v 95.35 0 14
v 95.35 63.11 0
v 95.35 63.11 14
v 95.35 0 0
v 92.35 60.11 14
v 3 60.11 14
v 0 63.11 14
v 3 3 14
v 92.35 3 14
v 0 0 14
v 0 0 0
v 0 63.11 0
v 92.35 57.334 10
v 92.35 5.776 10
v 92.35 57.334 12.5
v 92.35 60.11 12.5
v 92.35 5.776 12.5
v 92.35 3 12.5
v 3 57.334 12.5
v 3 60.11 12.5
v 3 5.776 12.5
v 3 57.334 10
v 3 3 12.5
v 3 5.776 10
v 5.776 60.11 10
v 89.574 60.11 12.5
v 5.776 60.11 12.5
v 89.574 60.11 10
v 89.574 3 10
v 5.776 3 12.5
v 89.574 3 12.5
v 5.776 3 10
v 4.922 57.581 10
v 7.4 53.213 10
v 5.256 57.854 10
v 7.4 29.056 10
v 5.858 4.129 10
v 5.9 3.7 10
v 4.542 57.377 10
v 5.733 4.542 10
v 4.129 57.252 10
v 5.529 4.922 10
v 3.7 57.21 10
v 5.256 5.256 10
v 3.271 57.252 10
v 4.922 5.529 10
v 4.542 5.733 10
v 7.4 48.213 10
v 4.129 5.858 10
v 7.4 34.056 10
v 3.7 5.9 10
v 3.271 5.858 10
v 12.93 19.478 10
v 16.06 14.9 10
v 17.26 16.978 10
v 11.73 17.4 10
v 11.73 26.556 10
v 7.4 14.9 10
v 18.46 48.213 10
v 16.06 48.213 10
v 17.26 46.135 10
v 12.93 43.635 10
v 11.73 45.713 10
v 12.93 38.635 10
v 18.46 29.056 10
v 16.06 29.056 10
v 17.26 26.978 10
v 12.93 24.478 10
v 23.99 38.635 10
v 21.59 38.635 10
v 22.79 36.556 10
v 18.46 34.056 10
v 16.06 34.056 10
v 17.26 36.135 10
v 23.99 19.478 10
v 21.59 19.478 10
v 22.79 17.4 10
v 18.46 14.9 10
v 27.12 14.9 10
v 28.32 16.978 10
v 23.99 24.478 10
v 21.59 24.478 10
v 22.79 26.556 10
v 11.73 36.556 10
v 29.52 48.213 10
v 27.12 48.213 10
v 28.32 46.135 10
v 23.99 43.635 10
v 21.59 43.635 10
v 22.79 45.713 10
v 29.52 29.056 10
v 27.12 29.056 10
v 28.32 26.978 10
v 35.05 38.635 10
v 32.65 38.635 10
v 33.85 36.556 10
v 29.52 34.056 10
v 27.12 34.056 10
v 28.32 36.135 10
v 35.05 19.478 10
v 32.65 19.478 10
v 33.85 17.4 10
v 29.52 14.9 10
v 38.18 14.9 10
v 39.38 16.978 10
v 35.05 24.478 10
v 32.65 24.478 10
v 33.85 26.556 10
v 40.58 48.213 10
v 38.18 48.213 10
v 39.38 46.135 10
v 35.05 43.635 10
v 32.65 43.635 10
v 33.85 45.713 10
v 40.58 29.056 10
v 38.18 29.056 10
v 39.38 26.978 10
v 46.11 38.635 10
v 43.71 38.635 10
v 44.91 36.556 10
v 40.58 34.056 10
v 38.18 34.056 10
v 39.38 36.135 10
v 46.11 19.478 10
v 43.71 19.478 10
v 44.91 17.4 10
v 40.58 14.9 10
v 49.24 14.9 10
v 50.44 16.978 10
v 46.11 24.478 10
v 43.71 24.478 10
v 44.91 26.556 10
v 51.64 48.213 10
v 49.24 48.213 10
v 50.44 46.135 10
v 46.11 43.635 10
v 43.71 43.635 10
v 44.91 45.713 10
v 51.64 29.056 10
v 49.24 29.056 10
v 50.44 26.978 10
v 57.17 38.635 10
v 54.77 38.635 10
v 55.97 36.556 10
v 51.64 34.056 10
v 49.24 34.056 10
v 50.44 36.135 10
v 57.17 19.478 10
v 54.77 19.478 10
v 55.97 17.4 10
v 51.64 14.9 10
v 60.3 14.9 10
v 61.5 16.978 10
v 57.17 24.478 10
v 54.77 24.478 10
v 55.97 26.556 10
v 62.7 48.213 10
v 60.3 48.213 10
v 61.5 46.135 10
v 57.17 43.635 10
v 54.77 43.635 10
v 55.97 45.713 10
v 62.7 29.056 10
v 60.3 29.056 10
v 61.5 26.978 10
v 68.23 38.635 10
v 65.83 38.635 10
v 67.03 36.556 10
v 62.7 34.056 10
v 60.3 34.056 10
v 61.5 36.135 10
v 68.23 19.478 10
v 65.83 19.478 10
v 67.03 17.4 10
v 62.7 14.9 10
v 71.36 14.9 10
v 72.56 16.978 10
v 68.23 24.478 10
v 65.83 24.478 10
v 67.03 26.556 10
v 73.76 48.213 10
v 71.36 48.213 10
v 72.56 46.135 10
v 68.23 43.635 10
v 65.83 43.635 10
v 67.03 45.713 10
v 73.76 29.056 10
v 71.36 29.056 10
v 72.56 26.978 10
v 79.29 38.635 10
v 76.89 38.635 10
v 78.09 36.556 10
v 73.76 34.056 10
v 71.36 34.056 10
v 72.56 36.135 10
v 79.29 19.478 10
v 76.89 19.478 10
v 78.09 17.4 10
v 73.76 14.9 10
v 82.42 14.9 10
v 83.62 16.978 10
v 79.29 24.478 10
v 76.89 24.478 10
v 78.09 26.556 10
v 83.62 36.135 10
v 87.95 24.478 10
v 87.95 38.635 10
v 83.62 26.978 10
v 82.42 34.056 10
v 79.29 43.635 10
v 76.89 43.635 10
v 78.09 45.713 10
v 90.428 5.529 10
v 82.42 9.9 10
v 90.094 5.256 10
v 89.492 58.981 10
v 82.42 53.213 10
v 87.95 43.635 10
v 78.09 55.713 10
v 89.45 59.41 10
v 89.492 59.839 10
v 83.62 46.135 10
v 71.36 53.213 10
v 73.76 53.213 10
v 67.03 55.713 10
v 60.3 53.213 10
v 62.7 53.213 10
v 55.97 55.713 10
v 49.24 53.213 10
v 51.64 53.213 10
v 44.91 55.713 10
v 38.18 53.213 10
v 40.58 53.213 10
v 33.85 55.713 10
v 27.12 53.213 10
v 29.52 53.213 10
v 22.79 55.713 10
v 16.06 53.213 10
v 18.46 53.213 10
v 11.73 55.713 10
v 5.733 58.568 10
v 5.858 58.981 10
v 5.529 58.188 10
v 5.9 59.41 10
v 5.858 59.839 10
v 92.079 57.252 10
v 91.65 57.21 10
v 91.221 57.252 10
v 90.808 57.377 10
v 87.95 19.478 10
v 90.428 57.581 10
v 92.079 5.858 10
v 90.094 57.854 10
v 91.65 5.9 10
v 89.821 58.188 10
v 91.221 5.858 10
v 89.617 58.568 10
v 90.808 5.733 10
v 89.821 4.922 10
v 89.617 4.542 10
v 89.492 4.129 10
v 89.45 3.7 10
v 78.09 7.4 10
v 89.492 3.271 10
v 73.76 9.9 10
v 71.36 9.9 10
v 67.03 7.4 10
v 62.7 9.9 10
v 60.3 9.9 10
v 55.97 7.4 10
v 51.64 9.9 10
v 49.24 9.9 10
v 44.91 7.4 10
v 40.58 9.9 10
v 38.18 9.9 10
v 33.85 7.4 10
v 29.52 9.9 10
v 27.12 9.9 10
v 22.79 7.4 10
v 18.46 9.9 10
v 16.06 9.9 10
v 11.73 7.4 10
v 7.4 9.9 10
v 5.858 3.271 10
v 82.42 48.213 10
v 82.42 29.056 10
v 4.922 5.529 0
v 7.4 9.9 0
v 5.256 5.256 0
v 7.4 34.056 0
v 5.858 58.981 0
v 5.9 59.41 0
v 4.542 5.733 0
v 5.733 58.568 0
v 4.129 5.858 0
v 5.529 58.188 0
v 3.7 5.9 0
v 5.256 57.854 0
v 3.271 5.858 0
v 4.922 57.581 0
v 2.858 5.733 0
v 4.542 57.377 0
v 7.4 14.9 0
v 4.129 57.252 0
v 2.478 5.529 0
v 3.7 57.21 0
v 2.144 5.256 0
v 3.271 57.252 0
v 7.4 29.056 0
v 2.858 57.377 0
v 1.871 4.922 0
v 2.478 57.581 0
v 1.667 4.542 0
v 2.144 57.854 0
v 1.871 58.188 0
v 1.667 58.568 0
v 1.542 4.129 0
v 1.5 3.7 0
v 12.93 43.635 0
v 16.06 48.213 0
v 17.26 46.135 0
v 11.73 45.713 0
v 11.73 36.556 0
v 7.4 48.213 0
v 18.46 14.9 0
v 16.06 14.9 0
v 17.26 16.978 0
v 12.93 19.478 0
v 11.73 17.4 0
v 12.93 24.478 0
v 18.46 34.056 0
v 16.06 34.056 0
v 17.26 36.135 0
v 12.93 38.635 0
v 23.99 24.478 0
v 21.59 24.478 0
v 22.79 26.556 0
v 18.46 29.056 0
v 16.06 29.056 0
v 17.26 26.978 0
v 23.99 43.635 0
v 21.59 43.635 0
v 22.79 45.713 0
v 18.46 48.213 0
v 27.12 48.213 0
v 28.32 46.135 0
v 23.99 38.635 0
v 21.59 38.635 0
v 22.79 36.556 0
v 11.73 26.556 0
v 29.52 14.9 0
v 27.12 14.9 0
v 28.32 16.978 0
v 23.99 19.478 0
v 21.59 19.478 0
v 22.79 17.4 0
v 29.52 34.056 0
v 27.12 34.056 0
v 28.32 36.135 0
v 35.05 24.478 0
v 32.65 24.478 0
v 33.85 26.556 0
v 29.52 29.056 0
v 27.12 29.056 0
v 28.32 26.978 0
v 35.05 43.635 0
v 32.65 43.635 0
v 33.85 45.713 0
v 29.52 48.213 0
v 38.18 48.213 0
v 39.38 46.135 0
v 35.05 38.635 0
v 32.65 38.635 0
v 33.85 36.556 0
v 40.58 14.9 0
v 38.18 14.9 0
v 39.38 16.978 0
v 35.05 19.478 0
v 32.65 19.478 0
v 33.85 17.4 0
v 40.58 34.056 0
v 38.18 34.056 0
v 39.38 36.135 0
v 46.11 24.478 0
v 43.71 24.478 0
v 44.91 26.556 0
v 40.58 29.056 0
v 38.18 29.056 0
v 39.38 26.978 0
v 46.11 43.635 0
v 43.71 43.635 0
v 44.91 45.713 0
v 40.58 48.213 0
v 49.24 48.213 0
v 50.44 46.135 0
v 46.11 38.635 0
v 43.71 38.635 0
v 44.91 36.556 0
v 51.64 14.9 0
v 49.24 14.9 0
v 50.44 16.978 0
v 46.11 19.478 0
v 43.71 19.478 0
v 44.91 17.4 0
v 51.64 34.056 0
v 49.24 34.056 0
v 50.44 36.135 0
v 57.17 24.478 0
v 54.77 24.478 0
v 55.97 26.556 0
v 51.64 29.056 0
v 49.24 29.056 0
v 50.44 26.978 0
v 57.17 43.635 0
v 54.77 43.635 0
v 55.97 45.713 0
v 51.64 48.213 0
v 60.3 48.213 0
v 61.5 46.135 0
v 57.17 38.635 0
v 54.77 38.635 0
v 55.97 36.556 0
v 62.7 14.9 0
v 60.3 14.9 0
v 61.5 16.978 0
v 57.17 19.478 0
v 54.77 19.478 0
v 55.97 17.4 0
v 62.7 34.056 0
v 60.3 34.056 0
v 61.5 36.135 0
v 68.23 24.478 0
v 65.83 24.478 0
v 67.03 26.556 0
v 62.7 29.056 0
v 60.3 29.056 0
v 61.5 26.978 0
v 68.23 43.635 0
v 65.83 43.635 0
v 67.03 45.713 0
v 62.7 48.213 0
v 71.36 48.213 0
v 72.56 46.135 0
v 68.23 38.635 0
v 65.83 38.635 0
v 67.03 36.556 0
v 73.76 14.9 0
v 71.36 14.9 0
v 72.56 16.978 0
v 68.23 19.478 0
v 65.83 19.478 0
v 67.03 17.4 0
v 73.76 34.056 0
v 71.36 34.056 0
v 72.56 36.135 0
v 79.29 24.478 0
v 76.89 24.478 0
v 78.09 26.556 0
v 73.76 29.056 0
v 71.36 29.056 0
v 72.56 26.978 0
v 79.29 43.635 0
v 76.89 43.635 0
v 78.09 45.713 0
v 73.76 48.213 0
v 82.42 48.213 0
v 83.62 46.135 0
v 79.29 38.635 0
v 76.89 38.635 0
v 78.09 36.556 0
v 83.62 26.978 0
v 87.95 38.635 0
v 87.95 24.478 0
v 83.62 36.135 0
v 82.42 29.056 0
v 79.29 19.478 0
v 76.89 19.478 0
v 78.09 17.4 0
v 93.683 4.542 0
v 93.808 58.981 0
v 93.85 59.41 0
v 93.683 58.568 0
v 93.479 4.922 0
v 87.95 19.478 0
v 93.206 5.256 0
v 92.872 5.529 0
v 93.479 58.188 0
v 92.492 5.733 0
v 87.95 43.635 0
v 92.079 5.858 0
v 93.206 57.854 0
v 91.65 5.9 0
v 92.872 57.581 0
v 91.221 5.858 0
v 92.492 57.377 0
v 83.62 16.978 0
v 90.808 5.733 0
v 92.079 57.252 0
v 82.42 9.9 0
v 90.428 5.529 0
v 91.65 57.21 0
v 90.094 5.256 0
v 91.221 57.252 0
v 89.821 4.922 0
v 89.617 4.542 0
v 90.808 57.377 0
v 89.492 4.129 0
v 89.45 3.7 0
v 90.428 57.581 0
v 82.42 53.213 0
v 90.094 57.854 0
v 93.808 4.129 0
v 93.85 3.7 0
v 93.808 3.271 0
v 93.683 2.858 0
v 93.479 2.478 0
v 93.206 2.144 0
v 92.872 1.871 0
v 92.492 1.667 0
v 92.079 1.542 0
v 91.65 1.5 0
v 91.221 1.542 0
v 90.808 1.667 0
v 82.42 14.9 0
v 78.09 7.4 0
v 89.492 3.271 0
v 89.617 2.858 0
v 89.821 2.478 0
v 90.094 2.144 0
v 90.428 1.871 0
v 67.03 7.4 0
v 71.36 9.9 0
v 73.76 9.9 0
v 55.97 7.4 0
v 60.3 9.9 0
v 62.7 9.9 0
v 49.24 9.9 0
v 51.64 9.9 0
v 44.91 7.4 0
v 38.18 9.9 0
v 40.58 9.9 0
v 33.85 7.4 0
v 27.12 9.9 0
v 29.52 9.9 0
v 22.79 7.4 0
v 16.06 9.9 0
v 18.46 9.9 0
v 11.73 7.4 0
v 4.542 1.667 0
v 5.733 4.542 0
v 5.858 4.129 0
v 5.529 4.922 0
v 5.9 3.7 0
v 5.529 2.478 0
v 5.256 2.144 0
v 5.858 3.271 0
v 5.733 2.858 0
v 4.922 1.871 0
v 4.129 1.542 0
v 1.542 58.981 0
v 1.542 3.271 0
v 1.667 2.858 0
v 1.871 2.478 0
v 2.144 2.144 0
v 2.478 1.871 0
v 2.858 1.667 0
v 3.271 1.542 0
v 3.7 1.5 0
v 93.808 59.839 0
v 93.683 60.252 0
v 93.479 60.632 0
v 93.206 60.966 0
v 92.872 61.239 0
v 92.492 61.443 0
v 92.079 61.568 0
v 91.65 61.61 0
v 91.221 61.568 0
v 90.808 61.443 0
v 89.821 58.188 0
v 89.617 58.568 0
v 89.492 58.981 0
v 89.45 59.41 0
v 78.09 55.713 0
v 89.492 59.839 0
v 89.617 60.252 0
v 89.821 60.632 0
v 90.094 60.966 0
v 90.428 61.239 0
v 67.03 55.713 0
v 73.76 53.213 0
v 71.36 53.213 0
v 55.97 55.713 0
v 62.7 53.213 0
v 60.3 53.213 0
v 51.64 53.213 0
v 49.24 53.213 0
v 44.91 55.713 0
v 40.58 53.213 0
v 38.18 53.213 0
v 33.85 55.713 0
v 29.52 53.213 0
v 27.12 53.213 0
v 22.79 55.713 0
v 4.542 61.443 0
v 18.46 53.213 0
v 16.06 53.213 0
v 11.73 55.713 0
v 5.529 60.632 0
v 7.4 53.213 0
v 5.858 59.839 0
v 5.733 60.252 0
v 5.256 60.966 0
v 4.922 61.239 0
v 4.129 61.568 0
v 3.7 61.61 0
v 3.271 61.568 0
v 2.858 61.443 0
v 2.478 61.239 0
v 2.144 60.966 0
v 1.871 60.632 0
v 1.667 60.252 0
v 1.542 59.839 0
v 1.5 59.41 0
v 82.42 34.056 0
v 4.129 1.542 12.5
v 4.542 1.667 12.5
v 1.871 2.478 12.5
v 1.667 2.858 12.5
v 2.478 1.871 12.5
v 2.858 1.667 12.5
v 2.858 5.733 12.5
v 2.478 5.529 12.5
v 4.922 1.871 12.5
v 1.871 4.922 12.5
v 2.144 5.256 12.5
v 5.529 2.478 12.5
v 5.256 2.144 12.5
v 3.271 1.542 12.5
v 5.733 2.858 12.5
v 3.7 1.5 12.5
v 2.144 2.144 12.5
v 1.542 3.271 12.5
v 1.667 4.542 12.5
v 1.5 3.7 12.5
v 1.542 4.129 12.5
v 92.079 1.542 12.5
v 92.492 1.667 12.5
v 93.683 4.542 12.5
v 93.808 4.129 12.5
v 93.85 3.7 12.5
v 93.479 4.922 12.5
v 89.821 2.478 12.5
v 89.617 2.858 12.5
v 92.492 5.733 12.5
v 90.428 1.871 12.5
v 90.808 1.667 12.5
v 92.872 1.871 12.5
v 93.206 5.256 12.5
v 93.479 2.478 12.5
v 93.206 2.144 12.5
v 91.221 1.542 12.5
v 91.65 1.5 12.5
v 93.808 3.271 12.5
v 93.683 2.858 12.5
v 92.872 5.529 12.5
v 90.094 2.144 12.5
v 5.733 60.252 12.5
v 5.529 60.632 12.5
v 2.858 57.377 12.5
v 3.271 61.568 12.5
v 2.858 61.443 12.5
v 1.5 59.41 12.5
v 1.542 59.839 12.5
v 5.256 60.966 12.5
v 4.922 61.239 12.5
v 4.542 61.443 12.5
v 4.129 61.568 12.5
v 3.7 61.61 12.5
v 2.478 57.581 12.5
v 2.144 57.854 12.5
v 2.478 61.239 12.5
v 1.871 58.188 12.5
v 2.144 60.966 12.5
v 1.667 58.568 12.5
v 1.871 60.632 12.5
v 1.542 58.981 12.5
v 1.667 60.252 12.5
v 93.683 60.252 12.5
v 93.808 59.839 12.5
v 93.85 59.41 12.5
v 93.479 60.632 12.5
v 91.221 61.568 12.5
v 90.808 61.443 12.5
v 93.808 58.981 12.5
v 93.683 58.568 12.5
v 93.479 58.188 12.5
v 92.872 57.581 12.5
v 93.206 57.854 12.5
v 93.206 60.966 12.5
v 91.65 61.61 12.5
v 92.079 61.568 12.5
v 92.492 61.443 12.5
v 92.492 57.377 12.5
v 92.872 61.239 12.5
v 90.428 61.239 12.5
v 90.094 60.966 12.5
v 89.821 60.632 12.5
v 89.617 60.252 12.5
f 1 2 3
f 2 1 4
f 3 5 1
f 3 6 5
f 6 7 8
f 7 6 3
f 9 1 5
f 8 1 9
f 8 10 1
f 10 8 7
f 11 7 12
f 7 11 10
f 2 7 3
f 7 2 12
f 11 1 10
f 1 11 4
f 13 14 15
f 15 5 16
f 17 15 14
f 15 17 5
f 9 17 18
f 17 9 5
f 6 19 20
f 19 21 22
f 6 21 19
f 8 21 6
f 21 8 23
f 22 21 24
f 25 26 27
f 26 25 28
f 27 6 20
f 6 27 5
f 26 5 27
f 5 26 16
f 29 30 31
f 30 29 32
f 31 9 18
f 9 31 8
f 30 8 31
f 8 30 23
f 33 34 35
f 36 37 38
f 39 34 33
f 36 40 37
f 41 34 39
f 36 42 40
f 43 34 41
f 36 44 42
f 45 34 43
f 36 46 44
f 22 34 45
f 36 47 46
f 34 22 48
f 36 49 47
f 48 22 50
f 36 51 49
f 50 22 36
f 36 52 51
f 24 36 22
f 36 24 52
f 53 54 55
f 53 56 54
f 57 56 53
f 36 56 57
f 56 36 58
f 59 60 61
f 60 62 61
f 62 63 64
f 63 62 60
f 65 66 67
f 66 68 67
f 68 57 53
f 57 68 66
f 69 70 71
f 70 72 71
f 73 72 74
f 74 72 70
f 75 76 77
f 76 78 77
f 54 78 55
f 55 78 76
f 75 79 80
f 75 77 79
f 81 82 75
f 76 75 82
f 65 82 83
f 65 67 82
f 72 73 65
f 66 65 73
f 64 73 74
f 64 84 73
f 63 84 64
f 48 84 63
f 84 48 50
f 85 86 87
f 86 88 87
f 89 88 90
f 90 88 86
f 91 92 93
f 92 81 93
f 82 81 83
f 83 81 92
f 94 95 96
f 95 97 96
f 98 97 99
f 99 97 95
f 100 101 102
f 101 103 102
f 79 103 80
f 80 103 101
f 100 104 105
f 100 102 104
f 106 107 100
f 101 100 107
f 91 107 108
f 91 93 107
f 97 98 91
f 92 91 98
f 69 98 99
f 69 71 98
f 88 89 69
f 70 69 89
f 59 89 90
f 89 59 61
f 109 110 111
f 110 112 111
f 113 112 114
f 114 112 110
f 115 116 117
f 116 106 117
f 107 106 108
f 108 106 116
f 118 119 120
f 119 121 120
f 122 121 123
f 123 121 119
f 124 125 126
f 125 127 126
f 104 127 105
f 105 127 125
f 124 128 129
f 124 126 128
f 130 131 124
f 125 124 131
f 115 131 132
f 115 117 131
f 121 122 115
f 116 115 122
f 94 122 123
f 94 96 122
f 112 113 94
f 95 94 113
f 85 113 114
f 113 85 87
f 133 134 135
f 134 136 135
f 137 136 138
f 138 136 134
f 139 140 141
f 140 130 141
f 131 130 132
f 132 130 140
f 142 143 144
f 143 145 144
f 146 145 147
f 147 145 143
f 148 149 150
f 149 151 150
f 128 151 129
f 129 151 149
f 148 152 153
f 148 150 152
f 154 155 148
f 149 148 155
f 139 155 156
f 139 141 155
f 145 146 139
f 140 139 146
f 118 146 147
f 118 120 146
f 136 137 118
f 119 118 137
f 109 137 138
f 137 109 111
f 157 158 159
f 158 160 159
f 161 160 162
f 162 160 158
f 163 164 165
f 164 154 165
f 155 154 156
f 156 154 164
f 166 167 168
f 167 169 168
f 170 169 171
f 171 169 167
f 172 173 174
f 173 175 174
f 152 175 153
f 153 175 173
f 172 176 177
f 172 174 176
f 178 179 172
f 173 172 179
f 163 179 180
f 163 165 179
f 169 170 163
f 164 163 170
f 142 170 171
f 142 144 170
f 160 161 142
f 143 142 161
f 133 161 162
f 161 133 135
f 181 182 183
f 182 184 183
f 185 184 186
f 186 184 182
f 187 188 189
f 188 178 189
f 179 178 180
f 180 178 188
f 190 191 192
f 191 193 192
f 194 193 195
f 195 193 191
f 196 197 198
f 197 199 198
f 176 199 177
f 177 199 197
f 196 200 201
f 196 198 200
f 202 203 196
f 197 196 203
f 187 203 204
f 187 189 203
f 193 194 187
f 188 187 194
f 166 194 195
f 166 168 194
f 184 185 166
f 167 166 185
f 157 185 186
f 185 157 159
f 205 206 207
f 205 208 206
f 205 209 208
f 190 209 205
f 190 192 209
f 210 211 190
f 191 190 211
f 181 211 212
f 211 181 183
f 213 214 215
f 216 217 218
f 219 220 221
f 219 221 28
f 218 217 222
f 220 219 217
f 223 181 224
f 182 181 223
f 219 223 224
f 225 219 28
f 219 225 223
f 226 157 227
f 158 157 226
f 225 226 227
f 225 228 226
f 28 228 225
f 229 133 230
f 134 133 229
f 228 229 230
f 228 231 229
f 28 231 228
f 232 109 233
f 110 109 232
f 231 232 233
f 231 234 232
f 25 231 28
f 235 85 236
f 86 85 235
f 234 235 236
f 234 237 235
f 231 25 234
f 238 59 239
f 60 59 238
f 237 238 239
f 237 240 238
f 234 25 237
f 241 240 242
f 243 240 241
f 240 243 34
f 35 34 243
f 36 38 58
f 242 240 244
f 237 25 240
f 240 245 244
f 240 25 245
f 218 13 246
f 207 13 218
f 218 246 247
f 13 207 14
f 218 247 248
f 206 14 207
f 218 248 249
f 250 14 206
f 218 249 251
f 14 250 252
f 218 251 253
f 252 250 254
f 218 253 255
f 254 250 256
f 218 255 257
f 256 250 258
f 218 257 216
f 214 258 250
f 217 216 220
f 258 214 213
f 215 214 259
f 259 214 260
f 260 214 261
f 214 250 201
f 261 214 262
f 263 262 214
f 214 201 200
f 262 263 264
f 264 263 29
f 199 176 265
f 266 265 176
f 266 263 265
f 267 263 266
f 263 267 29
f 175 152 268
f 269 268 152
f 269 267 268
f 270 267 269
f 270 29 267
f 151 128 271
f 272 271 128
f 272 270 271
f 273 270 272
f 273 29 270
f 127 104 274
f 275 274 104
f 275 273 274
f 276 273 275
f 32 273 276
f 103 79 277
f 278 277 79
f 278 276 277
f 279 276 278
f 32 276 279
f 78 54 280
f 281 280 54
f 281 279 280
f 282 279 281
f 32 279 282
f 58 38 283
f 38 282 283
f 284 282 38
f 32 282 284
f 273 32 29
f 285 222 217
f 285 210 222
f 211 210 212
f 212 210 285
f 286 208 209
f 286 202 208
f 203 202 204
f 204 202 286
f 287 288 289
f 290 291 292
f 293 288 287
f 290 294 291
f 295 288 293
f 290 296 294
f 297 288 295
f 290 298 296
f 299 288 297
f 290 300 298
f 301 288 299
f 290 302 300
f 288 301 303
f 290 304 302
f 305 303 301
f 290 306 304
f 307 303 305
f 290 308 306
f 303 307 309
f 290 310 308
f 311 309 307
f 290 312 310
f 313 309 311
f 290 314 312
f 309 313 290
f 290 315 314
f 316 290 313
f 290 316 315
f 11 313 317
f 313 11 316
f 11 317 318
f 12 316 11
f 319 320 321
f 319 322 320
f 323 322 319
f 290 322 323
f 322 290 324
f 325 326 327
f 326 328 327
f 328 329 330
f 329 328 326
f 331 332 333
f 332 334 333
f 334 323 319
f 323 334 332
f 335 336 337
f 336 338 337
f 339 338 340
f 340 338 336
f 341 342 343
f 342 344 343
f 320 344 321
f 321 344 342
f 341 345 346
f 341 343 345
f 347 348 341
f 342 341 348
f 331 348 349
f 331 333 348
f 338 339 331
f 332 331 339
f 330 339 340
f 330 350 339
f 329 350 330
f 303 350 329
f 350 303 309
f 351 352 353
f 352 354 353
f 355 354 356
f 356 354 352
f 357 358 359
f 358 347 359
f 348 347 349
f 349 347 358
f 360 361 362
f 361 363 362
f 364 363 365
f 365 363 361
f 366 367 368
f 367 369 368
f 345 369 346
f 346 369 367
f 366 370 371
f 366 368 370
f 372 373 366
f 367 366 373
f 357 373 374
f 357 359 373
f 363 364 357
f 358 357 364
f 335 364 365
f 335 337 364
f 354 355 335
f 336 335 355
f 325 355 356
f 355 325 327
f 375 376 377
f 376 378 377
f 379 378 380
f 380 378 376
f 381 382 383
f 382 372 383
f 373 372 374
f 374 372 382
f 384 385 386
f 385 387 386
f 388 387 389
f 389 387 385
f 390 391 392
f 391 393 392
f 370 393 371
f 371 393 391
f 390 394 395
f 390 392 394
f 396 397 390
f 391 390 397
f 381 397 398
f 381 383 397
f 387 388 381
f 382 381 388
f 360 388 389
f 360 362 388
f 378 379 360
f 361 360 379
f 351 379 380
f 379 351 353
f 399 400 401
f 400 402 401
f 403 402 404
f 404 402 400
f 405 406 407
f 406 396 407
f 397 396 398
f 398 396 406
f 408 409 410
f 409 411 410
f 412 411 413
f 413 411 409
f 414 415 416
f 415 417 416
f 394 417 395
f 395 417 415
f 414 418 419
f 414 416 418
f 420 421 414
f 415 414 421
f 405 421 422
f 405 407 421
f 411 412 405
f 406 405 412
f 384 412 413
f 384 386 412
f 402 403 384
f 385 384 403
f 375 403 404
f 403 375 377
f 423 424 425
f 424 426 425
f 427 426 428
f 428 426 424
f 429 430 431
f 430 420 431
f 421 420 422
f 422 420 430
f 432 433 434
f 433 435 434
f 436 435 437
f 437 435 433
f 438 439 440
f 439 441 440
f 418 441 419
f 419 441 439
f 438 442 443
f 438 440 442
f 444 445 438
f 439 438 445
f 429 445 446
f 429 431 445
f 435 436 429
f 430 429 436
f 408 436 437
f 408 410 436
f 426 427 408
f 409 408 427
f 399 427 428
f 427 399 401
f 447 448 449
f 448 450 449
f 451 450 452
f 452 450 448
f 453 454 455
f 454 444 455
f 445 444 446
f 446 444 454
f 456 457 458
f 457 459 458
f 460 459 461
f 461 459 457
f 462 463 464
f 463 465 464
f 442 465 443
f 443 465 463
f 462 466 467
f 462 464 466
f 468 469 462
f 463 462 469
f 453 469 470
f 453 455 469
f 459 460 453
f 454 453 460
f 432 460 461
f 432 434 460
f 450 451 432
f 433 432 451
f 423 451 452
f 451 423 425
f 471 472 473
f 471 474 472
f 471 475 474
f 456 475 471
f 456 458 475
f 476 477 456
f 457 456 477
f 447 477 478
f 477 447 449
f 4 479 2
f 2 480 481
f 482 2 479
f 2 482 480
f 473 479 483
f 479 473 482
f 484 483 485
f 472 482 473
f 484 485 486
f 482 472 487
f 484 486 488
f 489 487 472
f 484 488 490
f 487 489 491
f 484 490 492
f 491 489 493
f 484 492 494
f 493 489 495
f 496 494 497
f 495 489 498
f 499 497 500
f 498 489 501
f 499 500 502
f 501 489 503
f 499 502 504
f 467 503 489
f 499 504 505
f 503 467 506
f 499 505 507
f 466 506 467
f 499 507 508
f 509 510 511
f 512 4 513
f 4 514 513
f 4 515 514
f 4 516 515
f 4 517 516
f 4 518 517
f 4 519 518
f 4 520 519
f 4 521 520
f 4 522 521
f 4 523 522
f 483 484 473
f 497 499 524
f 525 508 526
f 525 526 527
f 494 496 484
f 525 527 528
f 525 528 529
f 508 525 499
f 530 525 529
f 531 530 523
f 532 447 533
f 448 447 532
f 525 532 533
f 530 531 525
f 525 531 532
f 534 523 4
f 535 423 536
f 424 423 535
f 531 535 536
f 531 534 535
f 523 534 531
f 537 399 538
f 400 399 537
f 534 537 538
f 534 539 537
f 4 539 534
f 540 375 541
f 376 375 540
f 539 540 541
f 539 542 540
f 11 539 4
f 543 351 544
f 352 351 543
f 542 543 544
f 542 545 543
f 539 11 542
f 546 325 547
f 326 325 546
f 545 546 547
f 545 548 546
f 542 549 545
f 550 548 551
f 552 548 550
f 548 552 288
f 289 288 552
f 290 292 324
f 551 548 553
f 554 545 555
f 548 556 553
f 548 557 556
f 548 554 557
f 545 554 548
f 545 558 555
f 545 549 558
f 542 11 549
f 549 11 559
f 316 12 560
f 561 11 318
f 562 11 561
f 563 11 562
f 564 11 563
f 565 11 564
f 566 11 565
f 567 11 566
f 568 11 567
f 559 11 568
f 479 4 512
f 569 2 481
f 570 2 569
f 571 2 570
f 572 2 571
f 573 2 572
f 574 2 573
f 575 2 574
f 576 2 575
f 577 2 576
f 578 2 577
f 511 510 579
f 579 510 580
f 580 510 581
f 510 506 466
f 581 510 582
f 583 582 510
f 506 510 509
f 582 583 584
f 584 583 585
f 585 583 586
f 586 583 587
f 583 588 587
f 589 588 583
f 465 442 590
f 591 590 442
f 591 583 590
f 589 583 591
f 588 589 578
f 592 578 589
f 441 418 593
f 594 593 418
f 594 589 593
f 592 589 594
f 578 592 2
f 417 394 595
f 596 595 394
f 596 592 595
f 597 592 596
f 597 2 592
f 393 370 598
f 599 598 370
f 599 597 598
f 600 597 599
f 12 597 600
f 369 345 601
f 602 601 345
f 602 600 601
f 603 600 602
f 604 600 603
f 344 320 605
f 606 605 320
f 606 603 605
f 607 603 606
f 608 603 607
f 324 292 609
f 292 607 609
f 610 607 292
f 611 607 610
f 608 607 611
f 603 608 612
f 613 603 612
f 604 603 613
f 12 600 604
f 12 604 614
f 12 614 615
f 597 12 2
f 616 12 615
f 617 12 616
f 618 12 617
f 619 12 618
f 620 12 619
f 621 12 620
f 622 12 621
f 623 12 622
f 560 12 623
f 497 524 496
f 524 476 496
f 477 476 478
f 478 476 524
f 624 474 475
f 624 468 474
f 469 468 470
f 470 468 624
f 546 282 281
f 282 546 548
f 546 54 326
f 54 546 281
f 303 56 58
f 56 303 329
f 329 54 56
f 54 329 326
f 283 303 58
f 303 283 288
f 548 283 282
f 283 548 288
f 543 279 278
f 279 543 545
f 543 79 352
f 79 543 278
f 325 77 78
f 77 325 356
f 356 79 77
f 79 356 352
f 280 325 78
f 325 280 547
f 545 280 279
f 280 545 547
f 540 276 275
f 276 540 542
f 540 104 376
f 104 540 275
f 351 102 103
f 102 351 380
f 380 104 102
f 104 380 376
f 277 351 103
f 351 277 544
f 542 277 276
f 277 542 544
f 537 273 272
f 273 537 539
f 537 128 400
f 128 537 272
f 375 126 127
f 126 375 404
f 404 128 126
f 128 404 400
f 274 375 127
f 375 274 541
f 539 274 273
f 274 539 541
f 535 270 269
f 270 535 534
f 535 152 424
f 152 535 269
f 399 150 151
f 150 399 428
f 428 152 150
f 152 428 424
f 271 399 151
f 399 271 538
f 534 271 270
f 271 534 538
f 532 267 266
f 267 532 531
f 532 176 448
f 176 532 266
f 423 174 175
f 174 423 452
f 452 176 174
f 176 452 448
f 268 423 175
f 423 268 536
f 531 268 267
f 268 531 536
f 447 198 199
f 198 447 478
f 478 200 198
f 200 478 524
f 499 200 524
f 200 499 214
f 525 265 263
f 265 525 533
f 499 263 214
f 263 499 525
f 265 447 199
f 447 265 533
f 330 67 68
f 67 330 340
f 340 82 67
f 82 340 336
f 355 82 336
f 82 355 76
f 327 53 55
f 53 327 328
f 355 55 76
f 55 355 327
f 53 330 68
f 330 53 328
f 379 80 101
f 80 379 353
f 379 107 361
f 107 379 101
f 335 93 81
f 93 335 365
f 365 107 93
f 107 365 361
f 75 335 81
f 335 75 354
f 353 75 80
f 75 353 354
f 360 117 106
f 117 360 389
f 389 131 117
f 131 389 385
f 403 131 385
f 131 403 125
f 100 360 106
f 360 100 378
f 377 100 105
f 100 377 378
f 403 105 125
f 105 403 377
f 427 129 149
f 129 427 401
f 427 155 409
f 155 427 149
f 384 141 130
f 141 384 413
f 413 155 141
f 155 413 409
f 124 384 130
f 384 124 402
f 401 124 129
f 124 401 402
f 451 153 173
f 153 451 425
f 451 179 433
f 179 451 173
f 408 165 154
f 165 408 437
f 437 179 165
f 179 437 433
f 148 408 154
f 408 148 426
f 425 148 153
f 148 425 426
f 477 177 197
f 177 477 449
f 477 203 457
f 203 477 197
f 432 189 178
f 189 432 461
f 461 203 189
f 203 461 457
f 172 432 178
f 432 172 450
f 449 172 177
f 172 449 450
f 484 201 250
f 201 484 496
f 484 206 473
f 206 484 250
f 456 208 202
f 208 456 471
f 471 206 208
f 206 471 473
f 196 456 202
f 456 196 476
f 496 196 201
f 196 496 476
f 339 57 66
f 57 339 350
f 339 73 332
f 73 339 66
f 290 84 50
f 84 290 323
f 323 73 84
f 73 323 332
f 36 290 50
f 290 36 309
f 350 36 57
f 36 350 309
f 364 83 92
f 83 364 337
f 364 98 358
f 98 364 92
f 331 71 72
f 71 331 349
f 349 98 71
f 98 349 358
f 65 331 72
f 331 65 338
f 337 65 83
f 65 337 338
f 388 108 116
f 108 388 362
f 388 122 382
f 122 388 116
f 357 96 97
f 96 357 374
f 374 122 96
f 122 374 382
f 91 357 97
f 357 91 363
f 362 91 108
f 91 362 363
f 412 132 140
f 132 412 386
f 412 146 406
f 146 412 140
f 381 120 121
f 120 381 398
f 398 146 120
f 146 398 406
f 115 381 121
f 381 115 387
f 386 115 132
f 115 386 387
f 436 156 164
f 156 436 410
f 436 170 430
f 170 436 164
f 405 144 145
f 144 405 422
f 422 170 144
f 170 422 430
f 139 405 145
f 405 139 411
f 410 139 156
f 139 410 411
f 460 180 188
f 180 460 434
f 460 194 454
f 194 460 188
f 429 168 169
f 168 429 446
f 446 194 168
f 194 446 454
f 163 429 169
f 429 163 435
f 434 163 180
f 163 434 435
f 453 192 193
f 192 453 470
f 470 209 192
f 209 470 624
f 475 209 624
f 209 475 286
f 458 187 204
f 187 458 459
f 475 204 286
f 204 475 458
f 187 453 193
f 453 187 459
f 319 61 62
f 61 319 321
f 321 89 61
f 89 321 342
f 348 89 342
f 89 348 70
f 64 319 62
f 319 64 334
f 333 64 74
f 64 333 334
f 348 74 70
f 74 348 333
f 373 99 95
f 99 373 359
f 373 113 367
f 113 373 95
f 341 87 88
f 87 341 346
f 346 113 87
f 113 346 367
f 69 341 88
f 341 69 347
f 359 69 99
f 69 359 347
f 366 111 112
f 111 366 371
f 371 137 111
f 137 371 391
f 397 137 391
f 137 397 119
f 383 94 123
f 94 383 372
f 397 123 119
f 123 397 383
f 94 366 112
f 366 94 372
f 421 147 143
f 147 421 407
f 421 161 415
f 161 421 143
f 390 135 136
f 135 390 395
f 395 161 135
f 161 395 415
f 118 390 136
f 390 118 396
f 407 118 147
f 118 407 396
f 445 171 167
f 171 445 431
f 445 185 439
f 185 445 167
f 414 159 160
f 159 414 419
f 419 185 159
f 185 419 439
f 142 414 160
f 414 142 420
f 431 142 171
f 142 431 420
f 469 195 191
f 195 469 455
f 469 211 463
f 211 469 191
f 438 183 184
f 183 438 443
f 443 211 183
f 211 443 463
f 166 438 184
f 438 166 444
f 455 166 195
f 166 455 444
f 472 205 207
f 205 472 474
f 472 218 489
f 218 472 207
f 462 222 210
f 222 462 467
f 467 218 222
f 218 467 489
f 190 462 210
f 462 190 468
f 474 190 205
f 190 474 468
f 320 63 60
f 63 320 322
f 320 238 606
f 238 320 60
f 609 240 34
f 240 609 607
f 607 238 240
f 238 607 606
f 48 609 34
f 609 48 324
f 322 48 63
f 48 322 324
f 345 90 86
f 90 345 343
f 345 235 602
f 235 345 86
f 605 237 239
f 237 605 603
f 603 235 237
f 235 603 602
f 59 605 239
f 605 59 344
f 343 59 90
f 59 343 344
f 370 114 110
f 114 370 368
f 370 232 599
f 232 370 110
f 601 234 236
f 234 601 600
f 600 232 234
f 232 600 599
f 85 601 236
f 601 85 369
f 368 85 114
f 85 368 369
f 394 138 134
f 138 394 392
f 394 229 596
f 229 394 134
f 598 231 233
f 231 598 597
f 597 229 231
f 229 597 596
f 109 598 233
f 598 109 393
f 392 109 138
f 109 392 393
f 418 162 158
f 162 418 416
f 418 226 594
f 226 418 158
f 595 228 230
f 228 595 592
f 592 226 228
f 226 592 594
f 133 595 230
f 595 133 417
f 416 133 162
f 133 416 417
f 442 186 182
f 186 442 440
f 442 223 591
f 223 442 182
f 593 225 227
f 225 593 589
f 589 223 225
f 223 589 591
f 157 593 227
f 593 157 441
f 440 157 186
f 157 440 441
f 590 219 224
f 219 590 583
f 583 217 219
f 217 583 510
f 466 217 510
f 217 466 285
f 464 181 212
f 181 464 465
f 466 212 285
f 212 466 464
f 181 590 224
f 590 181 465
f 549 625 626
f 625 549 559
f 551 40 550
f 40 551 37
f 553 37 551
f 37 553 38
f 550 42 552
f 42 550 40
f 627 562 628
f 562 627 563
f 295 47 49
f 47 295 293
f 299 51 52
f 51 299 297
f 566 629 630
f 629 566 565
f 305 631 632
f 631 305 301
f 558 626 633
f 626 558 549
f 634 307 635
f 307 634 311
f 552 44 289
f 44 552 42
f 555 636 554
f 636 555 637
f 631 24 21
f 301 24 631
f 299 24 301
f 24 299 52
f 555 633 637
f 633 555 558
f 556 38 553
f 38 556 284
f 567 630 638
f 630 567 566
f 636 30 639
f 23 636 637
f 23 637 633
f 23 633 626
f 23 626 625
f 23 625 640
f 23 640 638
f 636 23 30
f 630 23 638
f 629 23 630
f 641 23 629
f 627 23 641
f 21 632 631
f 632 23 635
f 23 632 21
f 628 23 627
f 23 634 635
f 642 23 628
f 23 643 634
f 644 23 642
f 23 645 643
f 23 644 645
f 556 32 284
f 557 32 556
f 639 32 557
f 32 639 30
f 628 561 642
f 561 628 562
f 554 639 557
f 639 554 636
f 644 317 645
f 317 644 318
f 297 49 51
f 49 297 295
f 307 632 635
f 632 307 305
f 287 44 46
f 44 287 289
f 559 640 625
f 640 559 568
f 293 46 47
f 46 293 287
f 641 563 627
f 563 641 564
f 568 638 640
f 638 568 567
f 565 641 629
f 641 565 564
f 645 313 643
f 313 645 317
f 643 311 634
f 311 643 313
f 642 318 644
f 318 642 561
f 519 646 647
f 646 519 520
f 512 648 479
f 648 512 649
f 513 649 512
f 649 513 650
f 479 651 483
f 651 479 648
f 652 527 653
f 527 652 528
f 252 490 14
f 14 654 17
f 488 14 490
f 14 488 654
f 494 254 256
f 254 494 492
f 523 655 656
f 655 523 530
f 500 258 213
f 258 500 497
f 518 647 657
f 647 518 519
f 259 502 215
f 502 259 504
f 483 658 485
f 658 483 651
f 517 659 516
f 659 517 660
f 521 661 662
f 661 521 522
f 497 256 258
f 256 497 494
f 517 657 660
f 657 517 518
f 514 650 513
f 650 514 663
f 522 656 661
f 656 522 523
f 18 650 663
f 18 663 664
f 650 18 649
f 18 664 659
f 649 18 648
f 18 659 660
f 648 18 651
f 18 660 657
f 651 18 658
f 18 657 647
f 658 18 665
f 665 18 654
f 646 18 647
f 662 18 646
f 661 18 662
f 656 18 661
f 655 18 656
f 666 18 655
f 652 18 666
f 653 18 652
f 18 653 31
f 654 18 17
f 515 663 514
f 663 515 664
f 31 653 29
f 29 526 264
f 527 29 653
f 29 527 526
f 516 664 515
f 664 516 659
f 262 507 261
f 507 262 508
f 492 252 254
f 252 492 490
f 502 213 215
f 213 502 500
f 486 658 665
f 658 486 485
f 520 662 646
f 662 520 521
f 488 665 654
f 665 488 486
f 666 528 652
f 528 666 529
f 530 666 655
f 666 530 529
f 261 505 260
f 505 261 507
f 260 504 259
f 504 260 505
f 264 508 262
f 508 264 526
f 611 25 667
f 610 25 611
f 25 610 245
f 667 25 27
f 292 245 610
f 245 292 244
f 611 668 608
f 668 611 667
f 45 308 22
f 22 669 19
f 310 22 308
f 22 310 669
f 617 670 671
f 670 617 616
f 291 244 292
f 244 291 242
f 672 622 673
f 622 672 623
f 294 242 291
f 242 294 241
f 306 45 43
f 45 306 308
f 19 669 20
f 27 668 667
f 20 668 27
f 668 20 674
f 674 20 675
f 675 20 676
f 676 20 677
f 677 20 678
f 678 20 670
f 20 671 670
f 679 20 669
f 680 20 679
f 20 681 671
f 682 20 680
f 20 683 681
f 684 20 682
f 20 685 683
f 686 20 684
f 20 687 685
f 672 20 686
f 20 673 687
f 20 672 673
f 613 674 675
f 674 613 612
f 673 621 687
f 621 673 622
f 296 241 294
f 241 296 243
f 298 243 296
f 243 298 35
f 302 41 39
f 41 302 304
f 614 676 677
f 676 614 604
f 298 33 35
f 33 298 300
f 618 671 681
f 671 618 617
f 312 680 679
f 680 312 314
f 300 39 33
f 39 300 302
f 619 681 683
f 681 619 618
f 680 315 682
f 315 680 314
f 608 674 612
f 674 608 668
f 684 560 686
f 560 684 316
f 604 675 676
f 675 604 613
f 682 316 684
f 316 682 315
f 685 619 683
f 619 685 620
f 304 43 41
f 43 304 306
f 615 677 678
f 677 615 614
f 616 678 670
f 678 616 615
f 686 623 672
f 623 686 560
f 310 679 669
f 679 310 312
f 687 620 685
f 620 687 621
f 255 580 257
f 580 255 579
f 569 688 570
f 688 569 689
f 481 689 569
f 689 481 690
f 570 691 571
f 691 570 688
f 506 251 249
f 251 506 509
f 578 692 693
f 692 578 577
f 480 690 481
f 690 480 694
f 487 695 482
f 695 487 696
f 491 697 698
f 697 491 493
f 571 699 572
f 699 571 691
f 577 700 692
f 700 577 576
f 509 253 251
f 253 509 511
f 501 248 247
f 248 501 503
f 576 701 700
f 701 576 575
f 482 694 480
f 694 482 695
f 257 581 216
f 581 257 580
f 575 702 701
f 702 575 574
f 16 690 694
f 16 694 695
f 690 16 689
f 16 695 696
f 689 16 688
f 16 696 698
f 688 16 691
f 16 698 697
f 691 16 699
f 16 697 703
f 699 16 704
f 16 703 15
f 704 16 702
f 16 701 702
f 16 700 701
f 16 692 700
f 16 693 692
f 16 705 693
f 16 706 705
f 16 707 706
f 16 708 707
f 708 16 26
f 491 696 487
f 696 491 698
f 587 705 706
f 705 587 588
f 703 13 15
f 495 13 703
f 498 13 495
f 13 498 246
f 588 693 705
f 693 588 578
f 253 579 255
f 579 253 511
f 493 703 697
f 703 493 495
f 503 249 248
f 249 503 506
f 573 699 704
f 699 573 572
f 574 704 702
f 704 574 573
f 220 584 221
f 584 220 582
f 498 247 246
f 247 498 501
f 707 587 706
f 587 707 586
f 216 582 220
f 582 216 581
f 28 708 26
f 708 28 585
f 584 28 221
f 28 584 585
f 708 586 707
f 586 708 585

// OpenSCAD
$fn = 32;

// ----------------------------------------------------------------------
// Honeycomb panel: 95.35 x 63.11 mm, 35 cells of 10 mm
// ----------------------------------------------------------------------

// --- parameters (mm) ---
panel_w = 95.35;          // panel width
panel_d = 63.11;          // panel depth
thick = 10;               // panel thickness
cell_r = 5;               // hex cell circumradius
pitch = 11.06;            // hex cell pitch (centre to centre)
web = 2.4;                // web between the cells
columns = 7;              // columns of cells
rows = 5;                 // rows of cells
cell_count = 35;          // total cells
shift_x = 11.73;          // first cell offset in x
shift_y = 12.4;           // first cell offset in y
mount_d = 4.4;            // corner mounting holes
hole_off = 3.7;           // mounting hole offset from the corners
rim_h = 14;               // rim height
rim_t = 3;                // rim wall thickness

difference() {
  union() {
    cube([panel_w, panel_d, thick]);
    /* rim around the panel, sunk 1 mm into the plate */
    translate([0, 0, thick - 1]) difference() {
      cube([panel_w, panel_d, rim_h - thick + 1]);
      translate([rim_t, rim_t, -2.5]) cube([panel_w - 2 * rim_t, panel_d - 2 * rim_t, rim_h - thick + 6]);
    }
  }
  /* hexagonal cells, point-up, cut right through the plate */
  for (row = [0 : rows - 1]) {
    for (col = [0 : columns - 1]) {
      translate([shift_x + col * pitch + (row % 2) * pitch / 2, shift_y + row * pitch * 0.866025, -2.5]) rotate([0, 0, 30]) cylinder(h = thick + 5, d = 2 * cell_r, $fn = 6);
    }
  }
  /* corner mounting holes, clear of the outer cell web */
  translate([3.7, 3.7, -2.5]) cylinder(h = thick + 5, d = mount_d);
  translate([91.65, 3.7, -2.5]) cylinder(h = thick + 5, d = mount_d);
  translate([3.7, 59.41, -2.5]) cylinder(h = thick + 5, d = mount_d);
  translate([91.65, 59.41, -2.5]) cylinder(h = thick + 5, d = mount_d);
}
